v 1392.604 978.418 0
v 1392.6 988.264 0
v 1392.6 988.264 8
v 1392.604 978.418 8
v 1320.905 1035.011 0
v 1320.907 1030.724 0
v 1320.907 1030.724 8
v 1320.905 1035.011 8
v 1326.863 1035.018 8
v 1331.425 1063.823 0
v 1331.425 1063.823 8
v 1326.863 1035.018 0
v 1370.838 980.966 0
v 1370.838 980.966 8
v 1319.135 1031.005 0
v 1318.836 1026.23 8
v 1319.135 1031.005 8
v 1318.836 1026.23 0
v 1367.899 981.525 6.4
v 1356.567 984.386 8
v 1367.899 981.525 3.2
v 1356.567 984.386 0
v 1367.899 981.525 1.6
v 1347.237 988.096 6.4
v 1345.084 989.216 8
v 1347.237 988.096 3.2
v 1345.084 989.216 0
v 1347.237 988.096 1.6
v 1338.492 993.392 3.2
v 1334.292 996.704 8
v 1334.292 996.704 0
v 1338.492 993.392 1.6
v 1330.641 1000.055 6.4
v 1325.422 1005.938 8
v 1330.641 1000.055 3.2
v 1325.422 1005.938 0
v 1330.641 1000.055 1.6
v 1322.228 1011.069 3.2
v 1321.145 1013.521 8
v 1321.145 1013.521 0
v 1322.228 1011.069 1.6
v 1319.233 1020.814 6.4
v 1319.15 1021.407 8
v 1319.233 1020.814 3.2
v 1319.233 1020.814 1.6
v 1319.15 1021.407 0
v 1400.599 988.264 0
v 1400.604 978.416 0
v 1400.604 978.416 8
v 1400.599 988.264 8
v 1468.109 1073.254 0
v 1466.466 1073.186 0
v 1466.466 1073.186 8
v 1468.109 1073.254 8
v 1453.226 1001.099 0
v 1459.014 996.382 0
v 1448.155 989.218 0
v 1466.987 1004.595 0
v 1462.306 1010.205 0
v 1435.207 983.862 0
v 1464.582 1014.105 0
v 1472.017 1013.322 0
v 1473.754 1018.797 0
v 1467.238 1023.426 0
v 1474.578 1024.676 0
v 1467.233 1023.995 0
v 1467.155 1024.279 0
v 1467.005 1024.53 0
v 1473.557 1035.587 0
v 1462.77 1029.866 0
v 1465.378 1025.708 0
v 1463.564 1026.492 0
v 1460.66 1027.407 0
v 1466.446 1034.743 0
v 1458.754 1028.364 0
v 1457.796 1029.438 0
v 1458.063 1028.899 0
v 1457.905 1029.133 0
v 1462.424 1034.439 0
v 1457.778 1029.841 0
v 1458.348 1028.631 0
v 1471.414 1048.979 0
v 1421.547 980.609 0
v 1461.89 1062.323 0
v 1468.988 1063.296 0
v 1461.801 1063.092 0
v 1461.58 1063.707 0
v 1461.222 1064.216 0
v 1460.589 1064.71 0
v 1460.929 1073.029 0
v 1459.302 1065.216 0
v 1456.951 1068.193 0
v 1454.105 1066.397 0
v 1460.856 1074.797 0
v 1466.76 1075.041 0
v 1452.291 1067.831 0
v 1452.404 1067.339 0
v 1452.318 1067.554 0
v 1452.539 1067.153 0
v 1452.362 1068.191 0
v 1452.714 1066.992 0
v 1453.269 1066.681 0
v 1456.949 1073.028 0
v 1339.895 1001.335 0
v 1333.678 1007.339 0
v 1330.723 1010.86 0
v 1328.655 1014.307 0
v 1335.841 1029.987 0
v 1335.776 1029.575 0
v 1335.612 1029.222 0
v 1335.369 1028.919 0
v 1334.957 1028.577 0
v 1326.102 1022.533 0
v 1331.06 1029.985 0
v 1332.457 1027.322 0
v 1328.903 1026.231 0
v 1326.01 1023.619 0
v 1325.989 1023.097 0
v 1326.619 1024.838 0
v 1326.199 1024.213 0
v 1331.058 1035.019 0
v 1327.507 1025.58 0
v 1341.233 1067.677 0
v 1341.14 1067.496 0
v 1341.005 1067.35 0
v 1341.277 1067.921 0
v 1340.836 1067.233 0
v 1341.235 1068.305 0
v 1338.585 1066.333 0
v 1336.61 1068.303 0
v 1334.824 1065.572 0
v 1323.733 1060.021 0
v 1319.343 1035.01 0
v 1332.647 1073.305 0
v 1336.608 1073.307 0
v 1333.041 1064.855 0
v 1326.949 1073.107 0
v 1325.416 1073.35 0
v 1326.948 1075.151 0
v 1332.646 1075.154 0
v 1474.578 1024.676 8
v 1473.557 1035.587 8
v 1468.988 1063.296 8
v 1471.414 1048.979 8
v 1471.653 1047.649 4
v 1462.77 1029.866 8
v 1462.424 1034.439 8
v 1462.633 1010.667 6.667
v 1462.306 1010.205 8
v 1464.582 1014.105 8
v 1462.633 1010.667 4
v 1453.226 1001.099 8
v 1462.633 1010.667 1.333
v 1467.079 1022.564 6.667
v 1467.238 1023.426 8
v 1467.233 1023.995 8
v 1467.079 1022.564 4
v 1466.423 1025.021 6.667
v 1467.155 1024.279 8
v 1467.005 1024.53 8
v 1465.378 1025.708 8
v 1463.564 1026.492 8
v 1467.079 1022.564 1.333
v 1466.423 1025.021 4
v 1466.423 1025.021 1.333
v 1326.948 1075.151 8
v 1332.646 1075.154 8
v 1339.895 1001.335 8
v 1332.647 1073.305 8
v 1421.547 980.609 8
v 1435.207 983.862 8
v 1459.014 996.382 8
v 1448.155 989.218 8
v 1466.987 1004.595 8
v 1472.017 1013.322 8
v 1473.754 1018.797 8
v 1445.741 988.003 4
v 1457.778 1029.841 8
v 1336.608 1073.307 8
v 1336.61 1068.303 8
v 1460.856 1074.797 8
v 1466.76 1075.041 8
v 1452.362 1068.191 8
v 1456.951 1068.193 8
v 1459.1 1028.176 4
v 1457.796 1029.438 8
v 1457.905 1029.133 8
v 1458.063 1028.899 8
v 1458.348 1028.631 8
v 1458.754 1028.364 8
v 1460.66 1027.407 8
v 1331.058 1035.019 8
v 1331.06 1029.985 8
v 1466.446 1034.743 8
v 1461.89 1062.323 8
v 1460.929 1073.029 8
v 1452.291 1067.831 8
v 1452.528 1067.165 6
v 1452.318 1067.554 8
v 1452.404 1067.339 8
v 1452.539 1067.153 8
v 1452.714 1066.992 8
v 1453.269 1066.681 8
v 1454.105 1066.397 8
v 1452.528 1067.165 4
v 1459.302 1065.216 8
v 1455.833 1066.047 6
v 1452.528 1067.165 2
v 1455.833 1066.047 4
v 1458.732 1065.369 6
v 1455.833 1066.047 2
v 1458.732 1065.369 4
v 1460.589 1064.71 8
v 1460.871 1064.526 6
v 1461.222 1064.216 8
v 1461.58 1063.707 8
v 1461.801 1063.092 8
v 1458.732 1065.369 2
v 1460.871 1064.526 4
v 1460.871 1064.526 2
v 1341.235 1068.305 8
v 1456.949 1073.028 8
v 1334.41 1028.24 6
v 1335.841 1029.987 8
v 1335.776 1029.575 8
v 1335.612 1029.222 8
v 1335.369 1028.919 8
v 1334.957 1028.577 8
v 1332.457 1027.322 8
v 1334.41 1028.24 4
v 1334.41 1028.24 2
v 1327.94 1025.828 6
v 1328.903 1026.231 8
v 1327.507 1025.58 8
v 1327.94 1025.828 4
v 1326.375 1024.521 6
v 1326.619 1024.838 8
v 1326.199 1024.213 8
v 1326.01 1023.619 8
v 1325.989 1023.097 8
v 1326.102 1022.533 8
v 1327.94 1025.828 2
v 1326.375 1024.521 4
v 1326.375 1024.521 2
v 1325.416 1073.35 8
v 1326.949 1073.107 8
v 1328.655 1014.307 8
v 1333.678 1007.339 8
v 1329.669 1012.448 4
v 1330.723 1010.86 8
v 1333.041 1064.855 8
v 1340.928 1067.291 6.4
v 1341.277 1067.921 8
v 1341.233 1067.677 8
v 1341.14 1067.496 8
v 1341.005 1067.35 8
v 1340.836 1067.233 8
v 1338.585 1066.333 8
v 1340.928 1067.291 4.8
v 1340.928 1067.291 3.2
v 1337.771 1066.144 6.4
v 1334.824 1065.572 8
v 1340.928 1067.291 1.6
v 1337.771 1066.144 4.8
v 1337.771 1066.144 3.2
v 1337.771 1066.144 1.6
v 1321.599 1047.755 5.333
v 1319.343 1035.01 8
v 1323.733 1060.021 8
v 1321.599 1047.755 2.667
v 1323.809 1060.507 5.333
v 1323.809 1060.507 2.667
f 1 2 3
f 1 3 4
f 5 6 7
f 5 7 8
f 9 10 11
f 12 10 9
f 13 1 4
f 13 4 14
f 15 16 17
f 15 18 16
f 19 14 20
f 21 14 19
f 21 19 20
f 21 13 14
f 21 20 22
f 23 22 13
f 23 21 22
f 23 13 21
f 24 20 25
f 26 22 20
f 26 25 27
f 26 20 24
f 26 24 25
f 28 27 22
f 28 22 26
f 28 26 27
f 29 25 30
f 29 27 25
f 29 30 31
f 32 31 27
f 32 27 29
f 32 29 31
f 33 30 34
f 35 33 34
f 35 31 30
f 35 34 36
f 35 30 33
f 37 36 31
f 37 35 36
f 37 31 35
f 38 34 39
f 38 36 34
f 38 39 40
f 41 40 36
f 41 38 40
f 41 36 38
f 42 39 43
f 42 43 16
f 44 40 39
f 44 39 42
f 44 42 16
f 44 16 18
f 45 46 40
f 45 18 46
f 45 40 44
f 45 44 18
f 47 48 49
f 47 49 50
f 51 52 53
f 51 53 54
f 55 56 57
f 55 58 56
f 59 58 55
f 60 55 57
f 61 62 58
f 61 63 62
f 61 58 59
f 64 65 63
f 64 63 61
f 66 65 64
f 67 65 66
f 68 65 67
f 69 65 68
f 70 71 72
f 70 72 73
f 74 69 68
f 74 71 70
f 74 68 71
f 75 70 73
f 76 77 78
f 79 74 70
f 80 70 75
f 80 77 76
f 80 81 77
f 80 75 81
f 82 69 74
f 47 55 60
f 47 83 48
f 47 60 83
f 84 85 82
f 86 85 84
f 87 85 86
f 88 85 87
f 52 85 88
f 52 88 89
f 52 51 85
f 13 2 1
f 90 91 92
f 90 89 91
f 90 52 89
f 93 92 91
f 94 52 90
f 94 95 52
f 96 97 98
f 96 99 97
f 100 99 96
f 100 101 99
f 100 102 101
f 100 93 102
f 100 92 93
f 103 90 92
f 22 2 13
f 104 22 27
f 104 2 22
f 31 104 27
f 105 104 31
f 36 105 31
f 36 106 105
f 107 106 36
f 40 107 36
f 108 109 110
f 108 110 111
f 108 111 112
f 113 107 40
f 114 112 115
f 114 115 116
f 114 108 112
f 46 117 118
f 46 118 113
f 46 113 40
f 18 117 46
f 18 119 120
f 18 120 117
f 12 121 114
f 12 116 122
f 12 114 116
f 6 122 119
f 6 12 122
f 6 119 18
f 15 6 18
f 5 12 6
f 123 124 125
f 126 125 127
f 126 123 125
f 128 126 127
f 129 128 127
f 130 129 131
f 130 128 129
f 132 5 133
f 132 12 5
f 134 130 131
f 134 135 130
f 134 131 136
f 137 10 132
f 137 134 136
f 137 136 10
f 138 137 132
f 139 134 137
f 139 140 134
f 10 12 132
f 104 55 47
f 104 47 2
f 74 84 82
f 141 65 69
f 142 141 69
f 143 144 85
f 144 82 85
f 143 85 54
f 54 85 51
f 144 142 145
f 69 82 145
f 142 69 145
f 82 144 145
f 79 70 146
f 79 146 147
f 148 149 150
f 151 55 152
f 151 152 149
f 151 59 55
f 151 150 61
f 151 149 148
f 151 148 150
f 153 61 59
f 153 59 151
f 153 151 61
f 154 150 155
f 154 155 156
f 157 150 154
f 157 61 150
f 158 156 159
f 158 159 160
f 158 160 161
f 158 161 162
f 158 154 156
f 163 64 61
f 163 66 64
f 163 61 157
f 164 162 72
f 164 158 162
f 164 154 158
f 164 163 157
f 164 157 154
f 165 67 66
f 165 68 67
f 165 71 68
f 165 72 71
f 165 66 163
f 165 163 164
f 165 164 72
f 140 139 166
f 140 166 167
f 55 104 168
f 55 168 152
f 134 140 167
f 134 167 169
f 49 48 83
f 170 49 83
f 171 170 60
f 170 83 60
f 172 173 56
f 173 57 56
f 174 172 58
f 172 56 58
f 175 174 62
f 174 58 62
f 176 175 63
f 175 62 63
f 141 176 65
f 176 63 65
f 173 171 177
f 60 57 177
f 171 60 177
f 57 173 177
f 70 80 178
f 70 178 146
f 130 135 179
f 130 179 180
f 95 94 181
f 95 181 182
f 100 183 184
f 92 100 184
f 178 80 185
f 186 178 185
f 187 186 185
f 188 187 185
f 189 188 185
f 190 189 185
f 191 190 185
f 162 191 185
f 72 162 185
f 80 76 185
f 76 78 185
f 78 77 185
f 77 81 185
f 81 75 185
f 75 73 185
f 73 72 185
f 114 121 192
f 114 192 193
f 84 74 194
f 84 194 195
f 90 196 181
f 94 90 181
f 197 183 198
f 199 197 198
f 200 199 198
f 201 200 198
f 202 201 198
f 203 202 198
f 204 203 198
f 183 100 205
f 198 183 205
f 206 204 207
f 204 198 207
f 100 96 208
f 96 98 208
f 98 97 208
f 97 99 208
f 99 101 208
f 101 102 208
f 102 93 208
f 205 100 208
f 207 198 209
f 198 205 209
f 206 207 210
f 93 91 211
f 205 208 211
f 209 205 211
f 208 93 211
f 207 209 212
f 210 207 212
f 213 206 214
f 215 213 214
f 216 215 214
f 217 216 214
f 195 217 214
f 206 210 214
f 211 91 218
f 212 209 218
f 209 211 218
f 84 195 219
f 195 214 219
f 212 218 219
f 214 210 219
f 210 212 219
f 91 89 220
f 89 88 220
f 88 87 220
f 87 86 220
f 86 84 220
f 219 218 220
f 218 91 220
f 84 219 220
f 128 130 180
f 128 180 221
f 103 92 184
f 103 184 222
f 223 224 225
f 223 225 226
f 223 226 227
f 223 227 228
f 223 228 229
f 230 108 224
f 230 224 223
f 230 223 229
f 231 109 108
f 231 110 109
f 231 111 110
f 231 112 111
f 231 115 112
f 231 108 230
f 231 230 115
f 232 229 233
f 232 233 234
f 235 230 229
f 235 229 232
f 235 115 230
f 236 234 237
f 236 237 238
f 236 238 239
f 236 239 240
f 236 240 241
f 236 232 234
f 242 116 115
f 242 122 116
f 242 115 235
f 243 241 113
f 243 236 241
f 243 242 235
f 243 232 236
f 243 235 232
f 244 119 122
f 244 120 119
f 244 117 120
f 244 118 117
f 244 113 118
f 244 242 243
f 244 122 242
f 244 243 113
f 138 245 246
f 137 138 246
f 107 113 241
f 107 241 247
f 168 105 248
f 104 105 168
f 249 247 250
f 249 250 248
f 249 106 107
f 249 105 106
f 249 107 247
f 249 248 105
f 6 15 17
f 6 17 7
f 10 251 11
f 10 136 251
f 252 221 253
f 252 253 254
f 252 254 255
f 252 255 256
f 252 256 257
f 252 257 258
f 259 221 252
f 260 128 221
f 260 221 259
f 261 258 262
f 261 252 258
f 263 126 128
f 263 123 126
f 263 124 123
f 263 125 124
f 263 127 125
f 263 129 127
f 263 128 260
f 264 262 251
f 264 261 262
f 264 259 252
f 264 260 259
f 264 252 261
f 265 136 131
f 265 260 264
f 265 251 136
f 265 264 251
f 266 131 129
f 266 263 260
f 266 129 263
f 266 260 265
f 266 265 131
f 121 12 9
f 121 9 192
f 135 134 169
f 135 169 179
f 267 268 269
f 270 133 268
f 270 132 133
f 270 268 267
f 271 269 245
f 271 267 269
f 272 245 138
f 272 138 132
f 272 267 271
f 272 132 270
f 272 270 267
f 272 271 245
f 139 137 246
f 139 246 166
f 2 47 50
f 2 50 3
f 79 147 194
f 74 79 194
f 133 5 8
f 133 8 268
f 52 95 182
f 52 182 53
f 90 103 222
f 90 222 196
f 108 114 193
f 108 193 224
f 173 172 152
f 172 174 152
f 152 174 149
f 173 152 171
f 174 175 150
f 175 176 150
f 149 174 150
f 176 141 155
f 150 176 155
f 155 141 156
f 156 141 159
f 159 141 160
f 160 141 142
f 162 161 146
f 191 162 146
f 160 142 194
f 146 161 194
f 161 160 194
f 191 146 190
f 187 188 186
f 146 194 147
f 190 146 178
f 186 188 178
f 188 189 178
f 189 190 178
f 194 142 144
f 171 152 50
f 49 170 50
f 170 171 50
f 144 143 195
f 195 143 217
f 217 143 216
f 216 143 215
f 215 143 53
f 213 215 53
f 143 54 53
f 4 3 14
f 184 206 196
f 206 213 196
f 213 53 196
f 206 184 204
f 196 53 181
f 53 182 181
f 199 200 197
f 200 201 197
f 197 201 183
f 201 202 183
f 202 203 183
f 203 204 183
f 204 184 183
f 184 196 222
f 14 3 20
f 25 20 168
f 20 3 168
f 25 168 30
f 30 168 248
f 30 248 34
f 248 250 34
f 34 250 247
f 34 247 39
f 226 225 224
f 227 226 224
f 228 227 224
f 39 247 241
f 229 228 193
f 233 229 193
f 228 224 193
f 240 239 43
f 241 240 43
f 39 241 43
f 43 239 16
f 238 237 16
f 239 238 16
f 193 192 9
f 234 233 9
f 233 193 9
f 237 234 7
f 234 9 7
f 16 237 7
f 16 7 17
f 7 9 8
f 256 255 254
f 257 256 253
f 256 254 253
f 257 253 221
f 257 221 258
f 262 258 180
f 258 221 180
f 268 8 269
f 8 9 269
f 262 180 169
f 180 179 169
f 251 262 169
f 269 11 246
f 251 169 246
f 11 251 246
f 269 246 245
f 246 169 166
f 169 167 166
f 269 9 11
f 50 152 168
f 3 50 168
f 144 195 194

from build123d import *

# Parameters (mm, degrees)
EXTRUDE_1_DEPTH = 8


with BuildPart() as part:
    # 草图1 → 凸台-拉伸1 (new body)
    with BuildSketch(Plane.XY):
        with BuildLine():
            Line((1400.603760099, 978.416369467), (1400.599392251, 988.263589195))
            Line((1400.599392251, 988.263589195), (1392.599712444, 988.263589195))
            Line((1392.599712444, 988.263589195), (1392.604079587, 978.417959503))
            add(Edge.make_bspline(
                [(1392.604079587, 978.417959503), (1384.30166337, 978.94733203), (1368.912777657, 980.70514512), (1347.037181685, 986.748020488), (1331.779283503, 998.008038547), (1319.839099854, 1012.229243702), (1318.288469561, 1024.341828932), (1319.135260859, 1031.004616696)],
                knots=[0, 0, 0, 0, 0.246033273, 0.460162014, 0.662188525, 0.799060766, 1, 1, 1, 1], degree=3))
            Line((1319.135260859, 1031.004616696), (1320.907243326, 1030.723962245))
            Line((1320.907243326, 1030.723962245), (1320.905341678, 1035.011187846))
            Line((1320.905341678, 1035.011187846), (1319.343435038, 1035.010495045))
            add(Edge.make_bspline(
                [(1319.343435038, 1035.010495045), (1321.434217291, 1047.780189011), (1324.298149422, 1060.432120676), (1325.415824413, 1073.350052662)],
                knots=[0, 0, 0, 0, 1, 1, 1, 1], degree=3))
            Line((1325.415824413, 1073.350052662), (1326.948986358, 1073.107223666))
            Line((1326.948986358, 1073.107223666), (1326.948079648, 1075.15138308))
            Line((1326.948079648, 1075.15138308), (1332.645915356, 1075.153910421))
            Line((1332.645915356, 1075.153910421), (1332.646735241, 1073.305497823))
            Line((1332.646735241, 1073.305497823), (1336.608040968, 1073.307254906))
            Line((1336.608040968, 1073.307254906), (1336.610260651, 1068.303028573))
            Line((1336.610260651, 1068.303028573), (1341.234650632, 1068.305079775))
            add(Edge.make_bspline(
                [(1341.234650632, 1068.305079775), (1341.484178537, 1067.240633889), (1340.286932477, 1067.107503445), (1339.002085334, 1066.41807256), (1337.47574421, 1066.046809065), (1334.726067539, 1065.751837387), (1332.596211567, 1064.738407546), (1331.425389742, 1063.822646585)],
                knots=[0, 0, 0, 0, 0.192766917, 0.2634426, 0.393742259, 0.603766483, 1, 1, 1, 1], degree=3))
            Line((1331.425389742, 1063.822646585), (1326.863118242, 1035.017597998))
            Line((1326.863118242, 1035.017597998), (1331.057954718, 1035.019458666))
            Line((1331.057954718, 1035.019458666), (1331.060187748, 1029.98514055))
            Line((1331.060187748, 1029.98514055), (1335.841257782, 1029.987261249))
            add(Edge.make_bspline(
                [(1335.841257782, 1029.987261249), (1335.823974875, 1029.113659646), (1333.934198394, 1027.840601132), (1331.095949112, 1026.764483365), (1327.508531347, 1026.008669295), (1325.609173799, 1024.074891704), (1326.102260107, 1022.533431935)],
                knots=[0, 0, 0, 0, 0.176554534, 0.474168244, 0.69551046, 1, 1, 1, 1], degree=3))
            add(Edge.make_bspline(
                [(1326.102260107, 1022.533431935), (1326.688090473, 1019.028661059), (1329.404776613, 1010.537208741), (1336.322738402, 1004.78156047), (1339.895283128, 1001.334985628)],
                knots=[0, 0, 0, 0, 0.415295232, 1, 1, 1, 1], degree=3))
            Line((1339.895283128, 1001.334985628), (1453.225525149, 1001.098930774))
            add(Edge.make_bspline(
                [(1453.225525149, 1001.098930774), (1456.41603516, 1004.195864104), (1461.770461312, 1008.228877627), (1465.772288531, 1016.352191438), (1466.675656416, 1020.771584156), (1467.46190007, 1024.283519039), (1465.732138964, 1025.517545827), (1464.649363752, 1026.209847157), (1463.563673383, 1026.491705662)],
                knots=[0, 0, 0, 0, 0.417472858, 0.611309404, 0.814395293, 0.872955231, 0.899659972, 1, 1, 1, 1], degree=3))
            add(Edge.make_bspline(
                [(1457.777895082, 1029.841463334), (1457.691538568, 1028.935335948), (1459.955886804, 1027.688543829), (1461.813917023, 1026.82312411), (1463.563673383, 1026.491705662)],
                knots=[0, 0, 0, 0, 0.320094329, 1, 1, 1, 1], degree=3))
            Line((1457.777895082, 1029.841463334), (1462.770085624, 1029.865645917))
            Line((1462.770085624, 1029.865645917), (1462.424250556, 1034.438915705))
            Line((1462.424250556, 1034.438915705), (1466.446301553, 1034.743067077))
            Line((1466.446301553, 1034.743067077), (1461.889510036, 1062.322541758))
            add(Edge.make_bspline(
                [(1452.362068525, 1068.191018948), (1452.063228547, 1067.291975571), (1453.550572586, 1066.39583292), (1456.001193688, 1066.067628013), (1459.255253794, 1065.245091068), (1461.850162915, 1064.537133592), (1461.889510036, 1062.322541758)],
                knots=[0, 0, 0, 0, 0.17200161, 0.374139345, 0.617870859, 1, 1, 1, 1], degree=3))
            Line((1452.362068525, 1068.191018948), (1456.951436219, 1068.193054615))
            Line((1456.951436219, 1068.193054615), (1456.949291773, 1073.027663064))
            Line((1456.949291773, 1073.027663064), (1460.92901528, 1073.029428317))
            Line((1460.92901528, 1073.029428317), (1460.855963084, 1074.796919448))
            Line((1460.855963084, 1074.796919448), (1466.760060369, 1075.040941762))
            Line((1466.760060369, 1075.040941762), (1466.466334548, 1073.186429915))
            Line((1466.466334548, 1073.186429915), (1468.109322459, 1073.254336267))
            add(Edge.make_bspline(
                [(1474.577797045, 1024.67595534), (1474.179758571, 1032.396128039), (1471.709505065, 1048.571943007), (1468.377527701, 1064.603635783), (1468.109322459, 1073.254336267)],
                knots=[0, 0, 0, 0, 0.472460007, 1, 1, 1, 1], degree=3))
            add(Edge.make_bspline(
                [(1400.603760099, 978.416369467), (1415.963129029, 979.277774), (1447.942432473, 983.227856531), (1473.641534196, 1007.502754347), (1474.577797045, 1024.67595534)],
                knots=[0, 0, 0, 0, 0.489063486, 1, 1, 1, 1], degree=3))
        make_face()
    extrude(amount=EXTRUDE_1_DEPTH)


solid = part.part
